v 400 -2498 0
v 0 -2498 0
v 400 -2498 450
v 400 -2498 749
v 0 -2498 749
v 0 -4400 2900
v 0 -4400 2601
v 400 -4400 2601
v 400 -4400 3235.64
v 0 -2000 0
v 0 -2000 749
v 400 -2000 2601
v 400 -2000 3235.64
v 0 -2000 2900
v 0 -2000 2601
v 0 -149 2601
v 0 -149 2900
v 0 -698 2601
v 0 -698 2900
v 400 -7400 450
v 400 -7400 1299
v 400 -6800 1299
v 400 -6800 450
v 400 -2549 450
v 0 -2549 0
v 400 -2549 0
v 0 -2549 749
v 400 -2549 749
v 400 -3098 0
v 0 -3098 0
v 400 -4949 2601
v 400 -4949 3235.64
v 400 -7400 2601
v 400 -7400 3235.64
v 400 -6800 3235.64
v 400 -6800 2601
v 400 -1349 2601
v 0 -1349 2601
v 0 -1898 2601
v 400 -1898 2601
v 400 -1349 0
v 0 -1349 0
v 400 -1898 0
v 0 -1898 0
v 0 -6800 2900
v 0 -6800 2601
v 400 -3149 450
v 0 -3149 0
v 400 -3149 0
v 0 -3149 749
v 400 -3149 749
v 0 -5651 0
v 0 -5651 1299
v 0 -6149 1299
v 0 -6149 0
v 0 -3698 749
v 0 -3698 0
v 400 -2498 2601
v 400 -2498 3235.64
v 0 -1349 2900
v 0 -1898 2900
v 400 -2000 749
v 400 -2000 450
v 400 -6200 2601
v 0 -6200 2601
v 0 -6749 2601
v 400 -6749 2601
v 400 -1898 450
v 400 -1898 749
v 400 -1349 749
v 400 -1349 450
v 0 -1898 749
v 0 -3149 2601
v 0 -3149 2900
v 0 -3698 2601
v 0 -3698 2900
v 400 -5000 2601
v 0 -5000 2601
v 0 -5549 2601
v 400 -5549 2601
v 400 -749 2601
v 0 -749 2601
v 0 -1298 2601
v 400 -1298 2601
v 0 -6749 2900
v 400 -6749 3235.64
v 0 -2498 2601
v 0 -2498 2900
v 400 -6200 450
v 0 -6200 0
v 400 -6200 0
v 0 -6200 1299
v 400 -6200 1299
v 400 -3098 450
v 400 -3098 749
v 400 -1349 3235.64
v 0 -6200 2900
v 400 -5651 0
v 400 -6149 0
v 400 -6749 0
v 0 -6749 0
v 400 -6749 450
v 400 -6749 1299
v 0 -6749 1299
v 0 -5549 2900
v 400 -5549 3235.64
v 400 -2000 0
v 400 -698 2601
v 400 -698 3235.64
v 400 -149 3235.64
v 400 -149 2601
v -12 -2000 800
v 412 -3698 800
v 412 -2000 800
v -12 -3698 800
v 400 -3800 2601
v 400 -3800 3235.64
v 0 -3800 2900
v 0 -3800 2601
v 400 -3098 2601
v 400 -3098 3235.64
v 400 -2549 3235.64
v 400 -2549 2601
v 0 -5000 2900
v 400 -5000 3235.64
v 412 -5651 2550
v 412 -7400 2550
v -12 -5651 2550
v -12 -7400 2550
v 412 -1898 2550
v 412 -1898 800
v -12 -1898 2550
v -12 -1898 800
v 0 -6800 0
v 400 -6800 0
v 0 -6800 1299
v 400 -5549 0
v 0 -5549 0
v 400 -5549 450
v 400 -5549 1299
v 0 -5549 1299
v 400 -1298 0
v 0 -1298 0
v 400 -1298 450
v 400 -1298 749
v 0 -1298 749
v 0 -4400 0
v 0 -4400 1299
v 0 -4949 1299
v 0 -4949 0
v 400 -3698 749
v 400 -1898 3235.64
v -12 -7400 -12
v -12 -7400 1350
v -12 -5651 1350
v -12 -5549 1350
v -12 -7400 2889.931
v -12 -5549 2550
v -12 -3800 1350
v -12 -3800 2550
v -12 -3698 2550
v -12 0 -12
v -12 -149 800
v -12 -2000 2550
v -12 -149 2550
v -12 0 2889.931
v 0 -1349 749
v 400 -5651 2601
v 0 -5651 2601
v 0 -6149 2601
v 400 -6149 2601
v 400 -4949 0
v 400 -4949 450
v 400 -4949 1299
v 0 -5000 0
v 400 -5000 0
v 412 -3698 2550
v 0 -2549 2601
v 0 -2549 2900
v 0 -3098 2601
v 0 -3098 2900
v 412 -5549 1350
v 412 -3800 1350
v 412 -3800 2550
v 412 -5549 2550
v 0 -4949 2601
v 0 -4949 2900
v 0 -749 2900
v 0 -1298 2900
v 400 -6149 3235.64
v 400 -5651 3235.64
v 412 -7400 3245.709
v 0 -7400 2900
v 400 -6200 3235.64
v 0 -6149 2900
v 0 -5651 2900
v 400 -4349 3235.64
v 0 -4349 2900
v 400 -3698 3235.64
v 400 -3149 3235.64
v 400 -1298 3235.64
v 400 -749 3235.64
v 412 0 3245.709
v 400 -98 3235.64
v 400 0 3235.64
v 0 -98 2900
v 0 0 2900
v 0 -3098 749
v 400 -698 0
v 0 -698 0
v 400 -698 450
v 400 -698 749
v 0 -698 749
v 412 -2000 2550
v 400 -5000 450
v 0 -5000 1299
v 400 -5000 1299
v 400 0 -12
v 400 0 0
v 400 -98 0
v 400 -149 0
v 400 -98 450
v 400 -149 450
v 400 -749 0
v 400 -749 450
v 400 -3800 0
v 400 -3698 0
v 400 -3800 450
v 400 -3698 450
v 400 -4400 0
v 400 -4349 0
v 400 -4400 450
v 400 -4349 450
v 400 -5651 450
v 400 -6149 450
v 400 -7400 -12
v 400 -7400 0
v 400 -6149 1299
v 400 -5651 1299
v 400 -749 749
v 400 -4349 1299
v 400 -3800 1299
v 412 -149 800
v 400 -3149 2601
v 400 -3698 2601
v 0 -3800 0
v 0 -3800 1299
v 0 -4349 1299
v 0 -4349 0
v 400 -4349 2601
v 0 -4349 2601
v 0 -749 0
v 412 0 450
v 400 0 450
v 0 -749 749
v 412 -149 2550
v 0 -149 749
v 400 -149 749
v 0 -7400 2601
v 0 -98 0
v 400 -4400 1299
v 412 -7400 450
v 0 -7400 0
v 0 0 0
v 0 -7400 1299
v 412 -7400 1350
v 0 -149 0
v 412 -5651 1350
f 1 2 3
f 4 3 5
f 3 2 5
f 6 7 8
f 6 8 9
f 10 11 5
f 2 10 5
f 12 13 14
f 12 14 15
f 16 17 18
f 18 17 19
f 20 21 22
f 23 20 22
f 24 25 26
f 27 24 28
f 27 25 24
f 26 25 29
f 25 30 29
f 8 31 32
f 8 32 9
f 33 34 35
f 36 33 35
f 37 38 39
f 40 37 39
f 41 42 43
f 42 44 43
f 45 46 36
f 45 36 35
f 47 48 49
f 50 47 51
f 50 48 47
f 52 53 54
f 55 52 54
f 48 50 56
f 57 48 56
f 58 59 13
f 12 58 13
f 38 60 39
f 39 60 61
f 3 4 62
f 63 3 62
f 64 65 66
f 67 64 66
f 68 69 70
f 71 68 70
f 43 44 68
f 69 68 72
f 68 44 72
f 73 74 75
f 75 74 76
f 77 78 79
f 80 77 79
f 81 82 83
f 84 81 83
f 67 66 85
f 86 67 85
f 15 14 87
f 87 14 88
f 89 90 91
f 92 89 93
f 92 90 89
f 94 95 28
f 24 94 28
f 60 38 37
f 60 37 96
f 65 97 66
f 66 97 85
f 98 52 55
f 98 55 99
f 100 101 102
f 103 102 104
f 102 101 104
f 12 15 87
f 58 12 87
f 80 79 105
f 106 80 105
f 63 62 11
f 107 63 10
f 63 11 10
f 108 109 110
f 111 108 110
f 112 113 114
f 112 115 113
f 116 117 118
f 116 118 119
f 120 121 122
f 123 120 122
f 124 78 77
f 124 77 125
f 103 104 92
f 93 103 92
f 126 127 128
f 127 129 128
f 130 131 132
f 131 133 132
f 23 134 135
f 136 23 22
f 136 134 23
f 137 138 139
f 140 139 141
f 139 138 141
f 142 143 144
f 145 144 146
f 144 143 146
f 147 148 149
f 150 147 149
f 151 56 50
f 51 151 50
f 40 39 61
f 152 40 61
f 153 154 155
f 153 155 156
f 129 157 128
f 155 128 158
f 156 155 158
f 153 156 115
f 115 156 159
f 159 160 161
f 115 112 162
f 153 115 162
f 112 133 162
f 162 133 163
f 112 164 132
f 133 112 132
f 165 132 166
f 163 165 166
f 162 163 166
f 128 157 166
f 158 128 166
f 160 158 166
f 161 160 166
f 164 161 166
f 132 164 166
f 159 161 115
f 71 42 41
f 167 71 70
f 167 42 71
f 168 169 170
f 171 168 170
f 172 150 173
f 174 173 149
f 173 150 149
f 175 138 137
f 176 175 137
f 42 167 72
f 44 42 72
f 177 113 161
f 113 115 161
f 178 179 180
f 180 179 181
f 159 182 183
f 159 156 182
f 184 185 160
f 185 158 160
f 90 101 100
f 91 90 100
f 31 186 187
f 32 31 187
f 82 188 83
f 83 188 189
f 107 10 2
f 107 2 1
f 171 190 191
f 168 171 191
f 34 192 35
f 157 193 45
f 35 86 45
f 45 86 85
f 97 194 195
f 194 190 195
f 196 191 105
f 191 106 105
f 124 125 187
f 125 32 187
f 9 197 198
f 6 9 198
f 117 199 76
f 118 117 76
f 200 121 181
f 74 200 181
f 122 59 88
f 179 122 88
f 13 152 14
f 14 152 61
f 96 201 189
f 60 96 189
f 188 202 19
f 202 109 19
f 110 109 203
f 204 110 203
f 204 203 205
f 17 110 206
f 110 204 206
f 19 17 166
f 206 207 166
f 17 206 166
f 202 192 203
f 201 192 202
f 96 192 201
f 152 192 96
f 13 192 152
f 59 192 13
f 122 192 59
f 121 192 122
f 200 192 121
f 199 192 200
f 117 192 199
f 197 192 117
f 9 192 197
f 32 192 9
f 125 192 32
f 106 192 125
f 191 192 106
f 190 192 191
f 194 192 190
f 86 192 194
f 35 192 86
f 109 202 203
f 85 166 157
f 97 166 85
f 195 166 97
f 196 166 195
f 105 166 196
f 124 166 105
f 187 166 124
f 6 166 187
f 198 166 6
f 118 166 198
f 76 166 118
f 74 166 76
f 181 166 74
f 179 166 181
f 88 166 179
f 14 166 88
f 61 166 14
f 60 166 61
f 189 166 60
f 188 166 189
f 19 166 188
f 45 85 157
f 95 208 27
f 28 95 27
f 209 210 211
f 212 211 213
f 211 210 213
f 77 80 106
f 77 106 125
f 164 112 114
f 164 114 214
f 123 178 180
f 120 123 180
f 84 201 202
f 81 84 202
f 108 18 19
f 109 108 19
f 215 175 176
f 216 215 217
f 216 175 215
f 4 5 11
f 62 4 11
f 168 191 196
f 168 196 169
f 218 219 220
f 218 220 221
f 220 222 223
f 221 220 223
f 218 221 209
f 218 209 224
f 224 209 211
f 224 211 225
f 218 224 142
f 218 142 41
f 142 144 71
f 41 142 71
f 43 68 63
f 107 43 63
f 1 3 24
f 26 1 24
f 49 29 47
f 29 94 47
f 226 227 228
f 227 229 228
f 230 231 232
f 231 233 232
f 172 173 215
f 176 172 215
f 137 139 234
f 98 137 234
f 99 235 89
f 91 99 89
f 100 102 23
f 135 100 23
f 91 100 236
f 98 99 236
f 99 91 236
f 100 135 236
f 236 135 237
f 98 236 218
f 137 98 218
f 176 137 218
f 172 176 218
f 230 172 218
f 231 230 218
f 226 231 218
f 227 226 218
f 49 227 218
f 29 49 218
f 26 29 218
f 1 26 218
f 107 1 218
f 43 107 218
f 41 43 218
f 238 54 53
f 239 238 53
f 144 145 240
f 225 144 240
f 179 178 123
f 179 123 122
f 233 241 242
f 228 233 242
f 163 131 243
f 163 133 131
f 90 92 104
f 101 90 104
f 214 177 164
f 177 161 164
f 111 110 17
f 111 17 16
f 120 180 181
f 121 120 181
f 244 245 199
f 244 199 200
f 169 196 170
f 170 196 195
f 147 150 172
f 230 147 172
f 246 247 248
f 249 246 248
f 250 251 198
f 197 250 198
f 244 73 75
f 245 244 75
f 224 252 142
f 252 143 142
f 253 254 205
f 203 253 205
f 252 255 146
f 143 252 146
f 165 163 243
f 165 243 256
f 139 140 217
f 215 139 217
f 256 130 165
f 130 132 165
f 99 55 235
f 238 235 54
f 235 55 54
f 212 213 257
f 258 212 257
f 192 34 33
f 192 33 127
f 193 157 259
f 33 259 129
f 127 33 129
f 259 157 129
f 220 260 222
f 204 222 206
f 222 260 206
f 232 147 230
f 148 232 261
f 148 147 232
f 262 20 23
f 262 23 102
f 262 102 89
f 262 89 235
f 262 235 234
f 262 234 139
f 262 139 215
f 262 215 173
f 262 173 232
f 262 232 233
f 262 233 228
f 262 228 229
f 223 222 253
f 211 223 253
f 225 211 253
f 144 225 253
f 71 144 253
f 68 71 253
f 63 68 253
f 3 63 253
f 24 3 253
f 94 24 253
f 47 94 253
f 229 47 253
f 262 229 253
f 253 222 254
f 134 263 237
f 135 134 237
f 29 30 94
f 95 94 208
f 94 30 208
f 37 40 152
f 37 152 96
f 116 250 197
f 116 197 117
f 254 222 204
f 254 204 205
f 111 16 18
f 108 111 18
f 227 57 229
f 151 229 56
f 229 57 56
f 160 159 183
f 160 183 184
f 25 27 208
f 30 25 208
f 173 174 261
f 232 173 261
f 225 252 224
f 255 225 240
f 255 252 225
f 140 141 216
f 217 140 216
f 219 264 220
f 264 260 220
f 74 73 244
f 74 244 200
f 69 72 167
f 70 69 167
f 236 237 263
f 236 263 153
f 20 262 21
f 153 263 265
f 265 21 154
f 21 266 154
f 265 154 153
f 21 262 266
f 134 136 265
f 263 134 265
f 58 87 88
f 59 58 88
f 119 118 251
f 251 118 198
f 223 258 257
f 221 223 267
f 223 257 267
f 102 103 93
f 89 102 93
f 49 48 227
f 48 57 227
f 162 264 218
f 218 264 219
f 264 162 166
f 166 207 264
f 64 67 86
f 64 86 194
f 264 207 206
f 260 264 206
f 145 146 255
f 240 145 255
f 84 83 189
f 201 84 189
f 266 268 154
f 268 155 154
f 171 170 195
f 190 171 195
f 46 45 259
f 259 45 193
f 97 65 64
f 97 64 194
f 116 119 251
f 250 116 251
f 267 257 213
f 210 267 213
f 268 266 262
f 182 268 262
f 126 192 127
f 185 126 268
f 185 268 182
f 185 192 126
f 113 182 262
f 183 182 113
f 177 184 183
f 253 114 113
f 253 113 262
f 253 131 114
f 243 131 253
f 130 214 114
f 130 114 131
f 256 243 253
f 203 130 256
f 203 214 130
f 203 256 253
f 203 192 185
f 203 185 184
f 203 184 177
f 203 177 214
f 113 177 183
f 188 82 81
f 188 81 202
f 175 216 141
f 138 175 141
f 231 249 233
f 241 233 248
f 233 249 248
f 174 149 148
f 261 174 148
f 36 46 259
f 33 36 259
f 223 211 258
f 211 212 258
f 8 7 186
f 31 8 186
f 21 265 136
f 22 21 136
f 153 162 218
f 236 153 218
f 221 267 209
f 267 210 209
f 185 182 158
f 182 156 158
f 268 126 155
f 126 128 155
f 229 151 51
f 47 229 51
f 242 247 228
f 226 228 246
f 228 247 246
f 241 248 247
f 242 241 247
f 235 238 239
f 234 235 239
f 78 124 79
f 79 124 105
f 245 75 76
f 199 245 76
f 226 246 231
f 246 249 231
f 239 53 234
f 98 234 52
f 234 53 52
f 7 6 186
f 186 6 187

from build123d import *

# Parameters (mm, degrees)
F0_W     = 51
F0_H     = 749
F0_H_2   = 1299
F0_H_3   = 699
F1_DEPTH = 400
F2_W     = 98
F2_H     = 3200
F2_W_2   = 549
F2_H_2   = 749
F2_W_3   = 498
F2_H_3   = 1299
F2_W_4   = 600
F2_H_4   = 599
F2_W_5   = 1749
F2_H_5   = 1750
F2_W_6   = 1698
F2_H_6   = 1200
F3_DEPTH = 12
F4_W     = 549
F4_H     = 699
F4_W_2   = 498
F4_W_3   = 600
F4_W_4   = 98
F4_H_2   = 2850
F4_H_3   = 849
F4_H_4   = 299
F4_W_5   = 1749
F4_H_5   = 1200
F4_W_6   = 1698
F4_H_6   = 1750
F5_DEPTH = 12
F6_W     = 400
F6_H     = 7400
F7_DEPTH = 12
F9_DEPTH = 7400.001


# Not quite as in the source:
# - a feature names something its author has since deleted; it is built from what else it names


with BuildPart() as f1:
    # F0 (on Right) → F1 (new body)
    with BuildSketch(Plane.YZ):
        Polygon((-149, 0), (-98, 0), (-98, 3300), (-149, 3300), (-149, 2601), (-149, 2550), (-149, 800), (-149, 749), align=None)
        with Locations((-1323.5, 374.5)):
            Rectangle(F0_W, F0_H)
        with Locations((-2523.5, 374.5)):
            Rectangle(F0_W, F0_H)
        with Locations((-3123.5, 374.5)):
            Rectangle(F0_W, F0_H)
        with Locations((-4374.5, 649.5)):
            Rectangle(F0_W, F0_H_2)
        with Locations((-4974.5, 649.5)):
            Rectangle(F0_W, F0_H_2)
        with Locations((-6174.5, 649.5)):
            Rectangle(F0_W, F0_H_2)
        with Locations((-6774.5, 649.5)):
            Rectangle(F0_W, F0_H_2)
        with Locations((-1323.5, 2950.5)):
            Rectangle(F0_W, F0_H_3)
        with Locations((-2523.5, 2950.5)):
            Rectangle(F0_W, F0_H_3)
        with Locations((-3123.5, 2950.5)):
            Rectangle(F0_W, F0_H_3)
        with Locations((-4374.5, 2950.5)):
            Rectangle(F0_W, F0_H_3)
        with Locations((-4974.5, 2950.5)):
            Rectangle(F0_W, F0_H_3)
        with Locations((-6174.5, 2950.5)):
            Rectangle(F0_W, F0_H_3)
        with Locations((-6774.5, 2950.5)):
            Rectangle(F0_W, F0_H_3)
        with Locations((-723.5, 374.5)):
            Rectangle(F0_W, F0_H)
        Polygon((-1898, 749), (-1898, 800), (-1898, 2550), (-1898, 2601), (-1898, 3300), (-1949, 3300), (-1949, 0), (-1898, 0), align=None)
        Polygon((-2000, 0), (-1949, 0), (-1949, 3300), (-2000, 3300), (-2000, 2601), (-2000, 2550), (-2000, 800), (-2000, 749), align=None)
        Polygon((-3698, 749), (-3698, 800), (-3698, 2550), (-3698, 2601), (-3698, 3300), (-3749, 3300), (-3749, 0), (-3698, 0), align=None)
        Polygon((-3800, 0), (-3749, 0), (-3749, 3300), (-3800, 3300), (-3800, 2601), (-3800, 2550), (-3800, 1350), (-3800, 1299), align=None)
        Polygon((-5549, 1299), (-5549, 1350), (-5549, 2550), (-5549, 2601), (-5549, 3300), (-5600, 3300), (-5600, 0), (-5549, 0), align=None)
        Polygon((-5651, 0), (-5600, 0), (-5600, 3300), (-5651, 3300), (-5651, 2601), (-5651, 2550), (-5651, 1350), (-5651, 1299), align=None)
        Polygon((-6149, 1299), (-5651, 1299), (-5651, 1350), (-7400, 1350), (-7400, 1299), (-6800, 1299), (-6749, 1299), (-6200, 1299), align=None)
        Polygon((-5651, 2550), (-5651, 2601), (-6149, 2601), (-6200, 2601), (-6749, 2601), (-6800, 2601), (-7400, 2601), (-7400, 2550), align=None)
        Polygon((-698, 749), (-149, 749), (-149, 800), (-1898, 800), (-1898, 749), (-1349, 749), (-1298, 749), (-749, 749), align=None)
        Polygon((-2498, 749), (-2000, 749), (-2000, 800), (-3698, 800), (-3698, 749), (-3149, 749), (-3098, 749), (-2549, 749), align=None)
        Polygon((-4349, 1299), (-3800, 1299), (-3800, 1350), (-5549, 1350), (-5549, 1299), (-5000, 1299), (-4949, 1299), (-4400, 1299), align=None)
        Polygon((-3800, 2550), (-3800, 2601), (-4349, 2601), (-4400, 2601), (-4949, 2601), (-5000, 2601), (-5549, 2601), (-5549, 2550), align=None)
        Polygon((-149, 2550), (-149, 2601), (-698, 2601), (-749, 2601), (-1298, 2601), (-1349, 2601), (-1898, 2601), (-1898, 2550), align=None)
        Polygon((-2000, 2550), (-2000, 2601), (-2498, 2601), (-2549, 2601), (-3098, 2601), (-3149, 2601), (-3698, 2601), (-3698, 2550), align=None)
        with Locations((-723.5, 2950.5)):
            Rectangle(F0_W, F0_H_3)
    extrude(amount=F1_DEPTH)

    # F2 (on face) → F3 (join)
    with BuildSketch(Plane(origin=(0, 0, 0), x_dir=(0, -1, 0), z_dir=(-1, 0, 0))):
        with Locations((49, 1600)):
            Rectangle(F2_W, F2_H)
        with Locations((1023.5, 374.5)):
            Rectangle(F2_W_2, F2_H_2)
        with Locations((1623.5, 374.5)):
            Rectangle(F2_W_2, F2_H_2)
        with Locations((2249, 374.5)):
            Rectangle(F2_W_3, F2_H_2)
        with Locations((2823.5, 374.5)):
            Rectangle(F2_W_2, F2_H_2)
        with Locations((3423.5, 374.5)):
            Rectangle(F2_W_2, F2_H_2)
        with Locations((4074.5, 649.5)):
            Rectangle(F2_W_2, F2_H_3)
        with Locations((4674.5, 649.5)):
            Rectangle(F2_W_2, F2_H_3)
        with Locations((5274.5, 649.5)):
            Rectangle(F2_W_2, F2_H_3)
        with Locations((5900, 649.5)):
            Rectangle(F2_W_3, F2_H_3)
        with Locations((6474.5, 649.5)):
            Rectangle(F2_W_2, F2_H_3)
        with Locations((7100, 649.5)):
            Rectangle(F2_W_4, F2_H_3)
        with Locations((1023.5, 2900.5)):
            Rectangle(F2_W_2, F2_H_4)
        with Locations((1623.5, 2900.5)):
            Rectangle(F2_W_2, F2_H_4)
        with Locations((2249, 2900.5)):
            Rectangle(F2_W_3, F2_H_4)
        with Locations((2823.5, 2900.5)):
            Rectangle(F2_W_2, F2_H_4)
        with Locations((3423.5, 2900.5)):
            Rectangle(F2_W_2, F2_H_4)
        with Locations((4074.5, 2900.5)):
            Rectangle(F2_W_2, F2_H_4)
        with Locations((4674.5, 2900.5)):
            Rectangle(F2_W_2, F2_H_4)
        with Locations((5274.5, 2900.5)):
            Rectangle(F2_W_2, F2_H_4)
        with Locations((5900, 2900.5)):
            Rectangle(F2_W_3, F2_H_4)
        with Locations((6474.5, 2900.5)):
            Rectangle(F2_W_2, F2_H_4)
        with Locations((7100, 2900.5)):
            Rectangle(F2_W_4, F2_H_4)
        with Locations((423.5, 2900.5)):
            Rectangle(F2_W_2, F2_H_4)
        with Locations((423.5, 374.5)):
            Rectangle(F2_W_2, F2_H_2)
        Polygon((98, 3200), (98, 0), (149, 0), (149, 749), (698, 749), (698, 0), (749, 0), (749, 749), (1298, 749), (1298, 0), (1349, 0), (1349, 749), (1898, 749), (1898, 0), (2000, 0), (2000, 749), (2498, 749), (2498, 0), (2549, 0), (2549, 749), (3098, 749), (3098, 0), (3149, 0), (3149, 749), (3698, 749), (3698, 0), (3800, 0), (3800, 1299), (4349, 1299), (4349, 0), (4400, 0), (4400, 1299), (4949, 1299), (4949, 0), (5000, 0), (5000, 1299), (5549, 1299), (5549, 0), (5651, 0), (5651, 1299), (6149, 1299), (6149, 0), (6200, 0), (6200, 1299), (6749, 1299), (6749, 0), (6800, 0), (6800, 1299), (7400, 1299), (7400, 1350), (5651, 1350), (5651, 2550), (7400, 2550), (7400, 2601), (6800, 2601), (6800, 3200), (6749, 3200), (6749, 2601), (6200, 2601), (6200, 3200), (6149, 3200), (6149, 2601), (5651, 2601), (5651, 3200), (5549, 3200), (5549, 2601), (5000, 2601), (5000, 3200), (4949, 3200), (4949, 2601), (4400, 2601), (4400, 3200), (4349, 3200), (4349, 2601), (3800, 2601), (3800, 3200), (3698, 3200), (3698, 2601), (3149, 2601), (3149, 3200), (3098, 3200), (3098, 2601), (2549, 2601), (2549, 3200), (2498, 3200), (2498, 2601), (2000, 2601), (2000, 3200), (1898, 3200), (1898, 2601), (1349, 2601), (1349, 3200), (1298, 3200), (1298, 2601), (749, 2601), (749, 3200), (698, 3200), (698, 2601), (149, 2601), (149, 3200), align=None)
        with Locations((1023.5, 1675)):
            Rectangle(F2_W_5, F2_H_5, mode=Mode.SUBTRACT)
        with Locations((2849, 1675)):
            Rectangle(F2_W_6, F2_H_5, mode=Mode.SUBTRACT)
        with Locations((4674.5, 1950)):
            Rectangle(F2_W_5, F2_H_6, mode=Mode.SUBTRACT)
    extrude(amount=F3_DEPTH)

    # F4 (on face) → F5 (join)
    with BuildSketch(Plane.YZ.offset(400)):
        with Locations((-1023.5, 2950.5)):
            Rectangle(F4_W, F4_H)
        with Locations((-1623.5, 2950.5)):
            Rectangle(F4_W, F4_H)
        with Locations((-2249, 2950.5)):
            Rectangle(F4_W_2, F4_H)
        with Locations((-2823.5, 2950.5)):
            Rectangle(F4_W, F4_H)
        with Locations((-3423.5, 2950.5)):
            Rectangle(F4_W, F4_H)
        with Locations((-4074.5, 2950.5)):
            Rectangle(F4_W, F4_H)
        with Locations((-4674.5, 2950.5)):
            Rectangle(F4_W, F4_H)
        with Locations((-5274.5, 2950.5)):
            Rectangle(F4_W, F4_H)
        with Locations((-5900, 2950.5)):
            Rectangle(F4_W_2, F4_H)
        with Locations((-6474.5, 2950.5)):
            Rectangle(F4_W, F4_H)
        with Locations((-7100, 2950.5)):
            Rectangle(F4_W_3, F4_H)
        with Locations((-49, 1875)):
            Rectangle(F4_W_4, F4_H_2)
        with Locations((-7100, 874.5)):
            Rectangle(F4_W_3, F4_H_3)
        with Locations((-2249, 599.5)):
            Rectangle(F4_W_2, F4_H_4)
        with Locations((-2823.5, 599.5)):
            Rectangle(F4_W, F4_H_4)
        with Locations((-3423.5, 599.5)):
            Rectangle(F4_W, F4_H_4)
        with Locations((-4074.5, 874.5)):
            Rectangle(F4_W, F4_H_3)
        with Locations((-4674.5, 874.5)):
            Rectangle(F4_W, F4_H_3)
        with Locations((-5274.5, 874.5)):
            Rectangle(F4_W, F4_H_3)
        with Locations((-5900, 874.5)):
            Rectangle(F4_W_2, F4_H_3)
        with Locations((-6474.5, 874.5)):
            Rectangle(F4_W, F4_H_3)
        Polygon((-149, 450), (-98, 450), (-98, 3300), (-149, 3300), (-149, 2601), (-698, 2601), (-698, 3300), (-749, 3300), (-749, 2601), (-1298, 2601), (-1298, 3300), (-1349, 3300), (-1349, 2601), (-1898, 2601), (-1898, 3300), (-2000, 3300), (-2000, 2601), (-2498, 2601), (-2498, 3300), (-2549, 3300), (-2549, 2601), (-3098, 2601), (-3098, 3300), (-3149, 3300), (-3149, 2601), (-3698, 2601), (-3698, 3300), (-3800, 3300), (-3800, 2601), (-4349, 2601), (-4349, 3300), (-4400, 3300), (-4400, 2601), (-4949, 2601), (-4949, 3300), (-5000, 3300), (-5000, 2601), (-5549, 2601), (-5549, 3300), (-5651, 3300), (-5651, 2601), (-6149, 2601), (-6149, 3300), (-6200, 3300), (-6200, 2601), (-6749, 2601), (-6749, 3300), (-6800, 3300), (-6800, 2601), (-7400, 2601), (-7400, 2550), (-5651, 2550), (-5651, 1350), (-7400, 1350), (-7400, 1299), (-6800, 1299), (-6800, 450), (-6749, 450), (-6749, 1299), (-6200, 1299), (-6200, 450), (-6149, 450), (-6149, 1299), (-5651, 1299), (-5651, 450), (-5549, 450), (-5549, 1299), (-5000, 1299), (-5000, 450), (-4949, 450), (-4949, 1299), (-4400, 1299), (-4400, 450), (-4349, 450), (-4349, 1299), (-3800, 1299), (-3800, 450), (-3698, 450), (-3698, 749), (-3149, 749), (-3149, 450), (-3098, 450), (-3098, 749), (-2549, 749), (-2549, 450), (-2498, 450), (-2498, 749), (-2000, 749), (-2000, 450), (-1898, 450), (-1898, 749), (-1349, 749), (-1349, 450), (-1298, 450), (-1298, 749), (-749, 749), (-749, 450), (-698, 450), (-698, 749), (-149, 749), align=None)
        with Locations((-4674.5, 1950)):
            Rectangle(F4_W_5, F4_H_5, mode=Mode.SUBTRACT)
        with Locations((-2849, 1675)):
            Rectangle(F4_W_6, F4_H_6, mode=Mode.SUBTRACT)
        with Locations((-1023.5, 1675)):
            Rectangle(F4_W_5, F4_H_6, mode=Mode.SUBTRACT)
        with Locations((-1623.5, 599.5)):
            Rectangle(F4_W, F4_H_4)
        with Locations((-1023.5, 599.5)):
            Rectangle(F4_W, F4_H_4)
        with Locations((-423.5, 599.5)):
            Rectangle(F4_W, F4_H_4)
        with Locations((-423.5, 2950.5)):
            Rectangle(F4_W, F4_H)
    extrude(amount=F5_DEPTH)

    # F6 (on face) → F7 (join)
    with BuildSketch(Plane(origin=(0, 0, 0), x_dir=(1, 0, 0), z_dir=(0, 0, -1))):
        with Locations((200, 3700)):
            Rectangle(F6_W, F6_H)
        Polygon((-12, 0), (0, 0), (0, 98), (0, 149), (0, 698), (0, 749), (0, 1298), (0, 1349), (0, 1898), (0, 2000), (0, 2498), (0, 2549), (0, 3098), (0, 3149), (0, 3698), (0, 3800), (0, 4349), (0, 4400), (0, 4949), (0, 5000), (0, 5549), (0, 5651), (0, 6149), (0, 6200), (0, 6749), (0, 6800), (0, 7400), (-12, 7400), align=None)
    extrude(amount=F7_DEPTH)

    # F8 (on face) → F9 (cut, through all)
    with BuildSketch(Plane(origin=(0, 0, 0), x_dir=(-1, 0, 0), z_dir=(0, 1, 0))):
        Polygon((-450, 3277.5948340298), (0, 2900), (50, 2858.0450184411), (50, 3377.5948340298), (-450, 3377.5948340298), align=None)
    extrude(amount=-F9_DEPTH, mode=Mode.SUBTRACT)


solid = f1.part
